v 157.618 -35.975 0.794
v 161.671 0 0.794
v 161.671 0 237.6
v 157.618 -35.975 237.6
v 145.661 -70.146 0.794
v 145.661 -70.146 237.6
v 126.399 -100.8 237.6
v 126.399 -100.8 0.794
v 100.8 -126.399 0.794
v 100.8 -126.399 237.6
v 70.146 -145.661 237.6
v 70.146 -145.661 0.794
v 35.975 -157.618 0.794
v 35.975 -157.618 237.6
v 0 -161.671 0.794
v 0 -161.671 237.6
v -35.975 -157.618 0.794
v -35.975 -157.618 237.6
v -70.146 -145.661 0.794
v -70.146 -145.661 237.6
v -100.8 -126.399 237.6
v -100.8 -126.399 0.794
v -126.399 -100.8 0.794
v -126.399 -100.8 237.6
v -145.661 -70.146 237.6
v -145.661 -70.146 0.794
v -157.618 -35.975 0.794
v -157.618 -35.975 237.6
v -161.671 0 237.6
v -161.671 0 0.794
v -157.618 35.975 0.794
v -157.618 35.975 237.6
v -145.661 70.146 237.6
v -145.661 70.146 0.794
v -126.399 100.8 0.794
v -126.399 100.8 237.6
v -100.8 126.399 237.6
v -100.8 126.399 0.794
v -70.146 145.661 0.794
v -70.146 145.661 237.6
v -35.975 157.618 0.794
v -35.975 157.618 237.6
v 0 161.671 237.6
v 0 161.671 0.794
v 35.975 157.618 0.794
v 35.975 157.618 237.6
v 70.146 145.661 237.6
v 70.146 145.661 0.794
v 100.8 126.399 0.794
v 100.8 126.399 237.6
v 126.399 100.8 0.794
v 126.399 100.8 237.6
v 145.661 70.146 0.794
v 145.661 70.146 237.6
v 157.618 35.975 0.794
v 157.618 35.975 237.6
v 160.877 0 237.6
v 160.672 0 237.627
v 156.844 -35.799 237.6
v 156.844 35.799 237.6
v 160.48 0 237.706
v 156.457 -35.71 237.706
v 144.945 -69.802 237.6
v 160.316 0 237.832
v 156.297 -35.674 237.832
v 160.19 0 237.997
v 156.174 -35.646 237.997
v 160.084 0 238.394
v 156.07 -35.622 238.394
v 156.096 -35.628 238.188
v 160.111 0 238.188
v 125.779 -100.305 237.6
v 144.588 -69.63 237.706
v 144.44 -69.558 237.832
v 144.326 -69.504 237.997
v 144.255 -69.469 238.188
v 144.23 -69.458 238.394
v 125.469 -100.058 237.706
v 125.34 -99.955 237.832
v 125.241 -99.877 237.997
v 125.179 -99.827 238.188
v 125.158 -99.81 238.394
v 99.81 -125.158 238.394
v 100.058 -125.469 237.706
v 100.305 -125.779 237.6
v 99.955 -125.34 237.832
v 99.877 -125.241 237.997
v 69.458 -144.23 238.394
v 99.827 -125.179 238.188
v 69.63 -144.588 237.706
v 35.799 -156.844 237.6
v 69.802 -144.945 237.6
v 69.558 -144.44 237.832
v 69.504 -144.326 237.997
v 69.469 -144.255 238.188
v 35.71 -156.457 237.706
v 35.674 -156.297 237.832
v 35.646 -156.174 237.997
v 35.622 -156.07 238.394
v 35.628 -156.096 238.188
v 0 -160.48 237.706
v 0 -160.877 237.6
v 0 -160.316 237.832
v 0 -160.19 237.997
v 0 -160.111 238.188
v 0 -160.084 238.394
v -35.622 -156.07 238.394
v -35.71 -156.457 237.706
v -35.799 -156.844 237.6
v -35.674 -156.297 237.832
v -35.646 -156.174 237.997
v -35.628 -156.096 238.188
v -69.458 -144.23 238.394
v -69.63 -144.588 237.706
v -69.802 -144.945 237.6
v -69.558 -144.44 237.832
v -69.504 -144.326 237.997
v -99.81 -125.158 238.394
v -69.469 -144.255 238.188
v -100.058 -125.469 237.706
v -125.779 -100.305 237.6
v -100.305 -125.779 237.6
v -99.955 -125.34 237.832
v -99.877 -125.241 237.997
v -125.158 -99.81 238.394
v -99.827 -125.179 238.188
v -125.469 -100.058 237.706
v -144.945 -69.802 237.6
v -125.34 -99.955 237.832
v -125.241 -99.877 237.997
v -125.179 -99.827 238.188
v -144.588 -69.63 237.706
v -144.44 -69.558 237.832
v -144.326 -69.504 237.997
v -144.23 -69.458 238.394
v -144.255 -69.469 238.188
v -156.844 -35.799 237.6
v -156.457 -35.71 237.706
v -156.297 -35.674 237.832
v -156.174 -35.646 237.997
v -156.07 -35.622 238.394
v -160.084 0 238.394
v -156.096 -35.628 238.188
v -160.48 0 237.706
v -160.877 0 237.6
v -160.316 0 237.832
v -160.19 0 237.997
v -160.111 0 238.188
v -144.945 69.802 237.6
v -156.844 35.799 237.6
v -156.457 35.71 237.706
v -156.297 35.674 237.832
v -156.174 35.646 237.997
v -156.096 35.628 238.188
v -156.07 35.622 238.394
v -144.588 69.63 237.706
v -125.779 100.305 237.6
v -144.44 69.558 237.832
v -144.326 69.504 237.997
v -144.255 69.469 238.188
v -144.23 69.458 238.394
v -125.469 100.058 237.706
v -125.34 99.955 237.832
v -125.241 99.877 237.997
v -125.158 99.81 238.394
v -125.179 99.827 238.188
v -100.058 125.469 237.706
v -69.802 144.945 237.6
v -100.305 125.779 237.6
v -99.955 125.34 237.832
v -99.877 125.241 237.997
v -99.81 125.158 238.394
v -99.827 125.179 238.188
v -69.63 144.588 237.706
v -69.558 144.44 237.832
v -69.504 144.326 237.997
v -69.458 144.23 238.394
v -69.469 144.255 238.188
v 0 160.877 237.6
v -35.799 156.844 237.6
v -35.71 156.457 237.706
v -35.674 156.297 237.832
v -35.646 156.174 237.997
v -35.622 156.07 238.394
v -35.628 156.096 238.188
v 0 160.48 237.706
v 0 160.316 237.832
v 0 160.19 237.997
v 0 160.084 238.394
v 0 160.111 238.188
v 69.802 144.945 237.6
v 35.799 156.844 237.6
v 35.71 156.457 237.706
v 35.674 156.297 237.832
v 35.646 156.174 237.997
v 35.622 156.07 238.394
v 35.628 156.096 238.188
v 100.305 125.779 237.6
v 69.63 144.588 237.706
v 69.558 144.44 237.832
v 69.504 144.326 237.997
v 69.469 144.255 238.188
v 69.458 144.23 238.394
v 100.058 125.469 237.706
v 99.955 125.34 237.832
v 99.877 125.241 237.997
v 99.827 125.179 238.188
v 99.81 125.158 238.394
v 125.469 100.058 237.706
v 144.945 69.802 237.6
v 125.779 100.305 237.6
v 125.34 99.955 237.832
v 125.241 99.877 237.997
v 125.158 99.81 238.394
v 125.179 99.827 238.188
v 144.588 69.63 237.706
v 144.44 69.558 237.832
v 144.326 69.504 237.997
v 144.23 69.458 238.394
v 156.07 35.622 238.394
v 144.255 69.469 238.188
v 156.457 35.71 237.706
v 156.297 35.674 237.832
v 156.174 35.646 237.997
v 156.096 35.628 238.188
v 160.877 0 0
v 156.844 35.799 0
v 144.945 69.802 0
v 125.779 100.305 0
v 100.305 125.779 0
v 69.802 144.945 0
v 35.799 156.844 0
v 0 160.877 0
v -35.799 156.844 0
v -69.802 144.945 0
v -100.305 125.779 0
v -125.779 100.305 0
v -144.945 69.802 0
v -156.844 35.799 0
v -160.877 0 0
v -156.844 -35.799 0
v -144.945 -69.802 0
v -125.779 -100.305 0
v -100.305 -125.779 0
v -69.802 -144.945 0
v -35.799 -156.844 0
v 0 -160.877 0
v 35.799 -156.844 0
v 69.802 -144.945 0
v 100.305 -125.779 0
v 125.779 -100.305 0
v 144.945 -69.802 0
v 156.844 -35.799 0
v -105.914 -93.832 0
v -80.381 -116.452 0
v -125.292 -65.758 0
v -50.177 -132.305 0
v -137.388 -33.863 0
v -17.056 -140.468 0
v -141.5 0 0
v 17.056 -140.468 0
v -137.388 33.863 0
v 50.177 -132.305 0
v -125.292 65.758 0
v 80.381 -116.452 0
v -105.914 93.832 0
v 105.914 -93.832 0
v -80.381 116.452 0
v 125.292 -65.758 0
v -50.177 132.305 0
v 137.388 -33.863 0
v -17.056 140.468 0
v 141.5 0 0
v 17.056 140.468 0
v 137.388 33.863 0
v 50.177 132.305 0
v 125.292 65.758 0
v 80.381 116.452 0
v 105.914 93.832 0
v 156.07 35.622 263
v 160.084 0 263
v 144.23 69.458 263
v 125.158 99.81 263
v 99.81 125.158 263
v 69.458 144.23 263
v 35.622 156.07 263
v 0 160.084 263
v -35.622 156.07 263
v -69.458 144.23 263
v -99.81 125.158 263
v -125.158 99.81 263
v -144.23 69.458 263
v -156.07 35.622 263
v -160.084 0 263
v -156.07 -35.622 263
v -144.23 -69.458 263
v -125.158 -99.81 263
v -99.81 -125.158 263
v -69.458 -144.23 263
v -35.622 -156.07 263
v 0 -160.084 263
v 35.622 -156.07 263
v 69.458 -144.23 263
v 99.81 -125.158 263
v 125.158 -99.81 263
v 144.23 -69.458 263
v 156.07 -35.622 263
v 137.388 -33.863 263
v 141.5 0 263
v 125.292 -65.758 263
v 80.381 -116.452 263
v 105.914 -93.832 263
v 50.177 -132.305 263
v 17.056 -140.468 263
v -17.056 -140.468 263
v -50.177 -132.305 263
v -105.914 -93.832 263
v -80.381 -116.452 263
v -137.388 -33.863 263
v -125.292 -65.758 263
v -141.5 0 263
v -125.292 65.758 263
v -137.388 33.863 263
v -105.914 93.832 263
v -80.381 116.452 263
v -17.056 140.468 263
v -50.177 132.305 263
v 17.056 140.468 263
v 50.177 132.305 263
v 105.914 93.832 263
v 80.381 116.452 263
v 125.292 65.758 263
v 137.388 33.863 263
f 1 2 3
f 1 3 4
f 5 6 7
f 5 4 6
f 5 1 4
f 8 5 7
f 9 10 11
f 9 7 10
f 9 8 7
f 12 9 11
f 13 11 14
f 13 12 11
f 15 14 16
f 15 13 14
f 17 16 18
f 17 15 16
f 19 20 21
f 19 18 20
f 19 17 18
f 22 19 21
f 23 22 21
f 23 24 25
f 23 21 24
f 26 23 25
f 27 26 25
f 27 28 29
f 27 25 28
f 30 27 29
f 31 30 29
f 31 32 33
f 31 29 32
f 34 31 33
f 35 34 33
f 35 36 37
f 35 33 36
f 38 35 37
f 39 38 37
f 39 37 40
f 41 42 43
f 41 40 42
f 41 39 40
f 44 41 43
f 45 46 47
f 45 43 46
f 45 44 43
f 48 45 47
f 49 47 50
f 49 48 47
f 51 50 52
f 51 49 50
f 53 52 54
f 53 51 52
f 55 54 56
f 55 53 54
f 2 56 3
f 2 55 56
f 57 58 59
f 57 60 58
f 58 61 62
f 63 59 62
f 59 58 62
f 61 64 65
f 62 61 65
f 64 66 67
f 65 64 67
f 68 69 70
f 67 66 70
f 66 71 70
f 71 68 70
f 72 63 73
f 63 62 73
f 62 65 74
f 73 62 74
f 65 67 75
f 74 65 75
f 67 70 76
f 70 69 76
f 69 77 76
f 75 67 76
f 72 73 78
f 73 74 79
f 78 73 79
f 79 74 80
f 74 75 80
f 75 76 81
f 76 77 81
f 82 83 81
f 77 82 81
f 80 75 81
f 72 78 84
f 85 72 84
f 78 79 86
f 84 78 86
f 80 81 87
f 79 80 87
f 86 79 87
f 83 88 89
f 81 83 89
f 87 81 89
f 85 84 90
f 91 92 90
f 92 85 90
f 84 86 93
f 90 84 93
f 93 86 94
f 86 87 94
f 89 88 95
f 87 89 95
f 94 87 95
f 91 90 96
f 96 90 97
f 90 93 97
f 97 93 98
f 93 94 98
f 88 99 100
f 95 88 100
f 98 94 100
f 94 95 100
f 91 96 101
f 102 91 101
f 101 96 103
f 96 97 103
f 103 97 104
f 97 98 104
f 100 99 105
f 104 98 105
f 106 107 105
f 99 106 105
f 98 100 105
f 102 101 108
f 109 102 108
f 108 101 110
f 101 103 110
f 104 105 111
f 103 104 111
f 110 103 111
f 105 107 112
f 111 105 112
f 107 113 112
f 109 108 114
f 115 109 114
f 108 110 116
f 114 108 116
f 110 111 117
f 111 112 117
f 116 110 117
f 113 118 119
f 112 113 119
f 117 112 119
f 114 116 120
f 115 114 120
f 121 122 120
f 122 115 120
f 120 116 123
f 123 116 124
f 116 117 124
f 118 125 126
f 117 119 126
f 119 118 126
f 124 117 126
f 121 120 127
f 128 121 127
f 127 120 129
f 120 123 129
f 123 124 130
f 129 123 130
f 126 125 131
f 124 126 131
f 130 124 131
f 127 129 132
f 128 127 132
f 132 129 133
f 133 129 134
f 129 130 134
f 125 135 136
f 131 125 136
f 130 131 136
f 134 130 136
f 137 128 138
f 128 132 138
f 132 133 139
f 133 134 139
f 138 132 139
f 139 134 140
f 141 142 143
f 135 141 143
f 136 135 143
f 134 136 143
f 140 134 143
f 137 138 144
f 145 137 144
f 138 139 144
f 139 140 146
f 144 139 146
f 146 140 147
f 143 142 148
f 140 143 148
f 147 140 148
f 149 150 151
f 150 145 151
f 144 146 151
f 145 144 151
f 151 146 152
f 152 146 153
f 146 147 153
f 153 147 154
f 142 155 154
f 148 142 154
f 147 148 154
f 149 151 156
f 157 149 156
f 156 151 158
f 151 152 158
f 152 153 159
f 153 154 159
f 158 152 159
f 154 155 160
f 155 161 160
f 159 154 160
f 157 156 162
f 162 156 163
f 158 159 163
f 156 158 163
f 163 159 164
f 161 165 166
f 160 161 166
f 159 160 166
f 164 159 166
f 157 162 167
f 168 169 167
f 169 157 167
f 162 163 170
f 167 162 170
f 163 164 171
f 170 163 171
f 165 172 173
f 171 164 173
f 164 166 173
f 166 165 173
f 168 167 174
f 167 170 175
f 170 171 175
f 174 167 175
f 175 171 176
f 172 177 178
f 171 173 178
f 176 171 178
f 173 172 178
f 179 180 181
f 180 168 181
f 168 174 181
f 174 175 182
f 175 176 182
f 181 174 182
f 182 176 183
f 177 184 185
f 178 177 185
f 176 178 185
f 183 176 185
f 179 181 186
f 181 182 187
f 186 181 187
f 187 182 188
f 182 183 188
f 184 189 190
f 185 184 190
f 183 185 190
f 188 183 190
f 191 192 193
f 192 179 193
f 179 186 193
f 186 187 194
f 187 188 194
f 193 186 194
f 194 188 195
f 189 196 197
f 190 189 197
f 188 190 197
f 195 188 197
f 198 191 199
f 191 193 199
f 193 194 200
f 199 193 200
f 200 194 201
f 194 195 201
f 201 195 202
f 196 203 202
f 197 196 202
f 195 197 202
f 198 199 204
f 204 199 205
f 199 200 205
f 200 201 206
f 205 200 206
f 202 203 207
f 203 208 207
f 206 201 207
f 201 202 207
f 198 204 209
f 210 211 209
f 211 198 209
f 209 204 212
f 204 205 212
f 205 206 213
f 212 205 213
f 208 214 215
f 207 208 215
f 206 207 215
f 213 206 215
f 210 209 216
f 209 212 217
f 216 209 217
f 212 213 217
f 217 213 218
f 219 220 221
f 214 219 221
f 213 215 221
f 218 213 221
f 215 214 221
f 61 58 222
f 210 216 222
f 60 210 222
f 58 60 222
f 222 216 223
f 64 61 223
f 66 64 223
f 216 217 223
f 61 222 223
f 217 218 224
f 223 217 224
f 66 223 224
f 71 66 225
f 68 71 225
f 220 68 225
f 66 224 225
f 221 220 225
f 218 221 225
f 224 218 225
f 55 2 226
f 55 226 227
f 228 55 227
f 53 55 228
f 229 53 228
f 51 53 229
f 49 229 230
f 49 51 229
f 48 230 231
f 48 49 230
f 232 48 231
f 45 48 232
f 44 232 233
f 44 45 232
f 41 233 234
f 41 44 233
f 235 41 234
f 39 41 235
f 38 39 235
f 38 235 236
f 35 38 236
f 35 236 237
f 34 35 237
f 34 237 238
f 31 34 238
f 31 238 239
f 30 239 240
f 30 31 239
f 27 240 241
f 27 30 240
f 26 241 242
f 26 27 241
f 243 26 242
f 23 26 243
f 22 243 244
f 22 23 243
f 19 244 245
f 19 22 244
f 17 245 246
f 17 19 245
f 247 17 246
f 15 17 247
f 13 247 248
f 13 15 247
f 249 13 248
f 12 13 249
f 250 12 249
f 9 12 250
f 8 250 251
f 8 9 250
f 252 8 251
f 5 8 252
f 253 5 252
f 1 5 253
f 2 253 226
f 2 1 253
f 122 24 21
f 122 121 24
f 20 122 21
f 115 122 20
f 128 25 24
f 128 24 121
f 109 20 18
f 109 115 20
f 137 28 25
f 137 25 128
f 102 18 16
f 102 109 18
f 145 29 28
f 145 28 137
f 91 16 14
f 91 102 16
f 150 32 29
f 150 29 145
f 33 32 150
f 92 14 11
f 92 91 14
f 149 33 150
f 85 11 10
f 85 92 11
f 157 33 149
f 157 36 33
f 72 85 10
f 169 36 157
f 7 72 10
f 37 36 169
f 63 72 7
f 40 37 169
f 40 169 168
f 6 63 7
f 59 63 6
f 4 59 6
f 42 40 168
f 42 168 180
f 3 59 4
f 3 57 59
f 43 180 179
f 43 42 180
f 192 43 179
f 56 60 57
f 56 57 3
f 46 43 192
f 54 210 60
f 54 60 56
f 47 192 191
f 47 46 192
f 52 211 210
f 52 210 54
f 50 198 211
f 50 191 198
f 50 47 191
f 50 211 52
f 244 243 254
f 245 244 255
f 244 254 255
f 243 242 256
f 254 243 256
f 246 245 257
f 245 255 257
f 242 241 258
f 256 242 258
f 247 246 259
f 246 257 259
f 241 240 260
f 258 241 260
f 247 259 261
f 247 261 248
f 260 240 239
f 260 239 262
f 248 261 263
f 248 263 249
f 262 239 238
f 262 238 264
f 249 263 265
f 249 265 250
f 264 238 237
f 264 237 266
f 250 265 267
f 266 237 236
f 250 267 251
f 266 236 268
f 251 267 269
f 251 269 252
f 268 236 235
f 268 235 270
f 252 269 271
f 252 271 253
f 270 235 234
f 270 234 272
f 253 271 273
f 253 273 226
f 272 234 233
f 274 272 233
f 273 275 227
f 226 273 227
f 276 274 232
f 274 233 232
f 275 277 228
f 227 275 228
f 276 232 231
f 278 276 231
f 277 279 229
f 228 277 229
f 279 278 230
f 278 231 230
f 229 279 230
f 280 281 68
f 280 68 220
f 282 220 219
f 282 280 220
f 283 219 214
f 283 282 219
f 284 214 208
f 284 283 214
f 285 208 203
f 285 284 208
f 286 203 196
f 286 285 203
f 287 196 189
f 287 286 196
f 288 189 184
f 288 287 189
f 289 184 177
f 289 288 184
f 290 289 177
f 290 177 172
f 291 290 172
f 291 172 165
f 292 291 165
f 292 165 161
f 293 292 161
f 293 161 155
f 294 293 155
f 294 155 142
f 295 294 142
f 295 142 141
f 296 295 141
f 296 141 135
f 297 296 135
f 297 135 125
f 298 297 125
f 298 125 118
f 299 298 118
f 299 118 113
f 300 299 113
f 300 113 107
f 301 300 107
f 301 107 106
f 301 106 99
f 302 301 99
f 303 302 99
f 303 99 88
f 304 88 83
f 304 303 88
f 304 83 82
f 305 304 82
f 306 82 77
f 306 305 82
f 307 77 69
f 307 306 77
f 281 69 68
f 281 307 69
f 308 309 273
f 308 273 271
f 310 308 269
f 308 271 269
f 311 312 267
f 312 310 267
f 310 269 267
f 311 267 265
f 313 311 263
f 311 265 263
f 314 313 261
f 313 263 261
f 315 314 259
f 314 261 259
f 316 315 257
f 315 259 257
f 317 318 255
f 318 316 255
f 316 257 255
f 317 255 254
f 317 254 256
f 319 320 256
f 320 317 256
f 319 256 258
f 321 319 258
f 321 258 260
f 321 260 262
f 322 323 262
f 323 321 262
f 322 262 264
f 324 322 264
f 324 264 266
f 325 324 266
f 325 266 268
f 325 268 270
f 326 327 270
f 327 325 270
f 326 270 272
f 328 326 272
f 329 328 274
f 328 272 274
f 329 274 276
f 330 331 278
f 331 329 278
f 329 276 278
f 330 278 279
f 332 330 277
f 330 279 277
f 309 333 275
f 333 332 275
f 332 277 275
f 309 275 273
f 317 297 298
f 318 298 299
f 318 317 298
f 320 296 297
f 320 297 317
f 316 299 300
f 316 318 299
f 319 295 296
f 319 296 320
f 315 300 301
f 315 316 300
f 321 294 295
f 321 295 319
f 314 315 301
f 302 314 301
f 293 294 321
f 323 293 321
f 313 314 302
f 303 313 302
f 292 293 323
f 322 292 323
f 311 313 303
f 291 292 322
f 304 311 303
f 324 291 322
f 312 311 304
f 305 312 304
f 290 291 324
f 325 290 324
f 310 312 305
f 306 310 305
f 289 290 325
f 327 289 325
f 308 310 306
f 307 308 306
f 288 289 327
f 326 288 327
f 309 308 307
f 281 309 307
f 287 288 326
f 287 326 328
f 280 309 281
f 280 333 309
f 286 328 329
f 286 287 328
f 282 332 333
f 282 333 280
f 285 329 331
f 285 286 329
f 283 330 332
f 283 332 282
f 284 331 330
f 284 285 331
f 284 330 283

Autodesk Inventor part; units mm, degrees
ref_plane "YZ Plane" through (0, 0, 0) normal (1, 0, 0) x (0, 1, 0)
ref_plane "XZ Plane" through (0, 0, 0) normal (0, 1, 0) x (-1, 0, 0)
ref_plane "XY Plane" through (0, 0, 0) normal (0, 0, 1) x (1, 0, 0)
sketch "Sketch1" plane through (0, 0, 0) normal (0, 0, 1) x (1, 0, 0)
  circle A0 centre (0, 0) radius 141.5
  circle A1 centre (0, 0) radius 161.671
  dimension "d0" = 283
  dimension "d1" = 323.342
extrude "Extrusion1" add sketch "Sketch1" along normal blind 263
sketch "Sketch2" plane through (0, 0, 263) normal (0, 0, 1) x (1, 0, 0)
  circle A0 centre (0, 0) radius 161.671 projected
  circle A1 centre (0, 0) radius 160.0835
  dimension "d4" = 320.167
extrude "Extrusion2" cut sketch "Sketch2" against normal blind 25.4
fillet "Fillet1" radius 0.7937 1 edges at (-160.0835, 0, 237.6)
chamfer "Chamfer1" distance 0.7937 angle 45 1 edges at (-161.671, 0, 0)
properties part number "A1-19027-400-09 HCWI liner - drain" material "Iron, HCWI"
